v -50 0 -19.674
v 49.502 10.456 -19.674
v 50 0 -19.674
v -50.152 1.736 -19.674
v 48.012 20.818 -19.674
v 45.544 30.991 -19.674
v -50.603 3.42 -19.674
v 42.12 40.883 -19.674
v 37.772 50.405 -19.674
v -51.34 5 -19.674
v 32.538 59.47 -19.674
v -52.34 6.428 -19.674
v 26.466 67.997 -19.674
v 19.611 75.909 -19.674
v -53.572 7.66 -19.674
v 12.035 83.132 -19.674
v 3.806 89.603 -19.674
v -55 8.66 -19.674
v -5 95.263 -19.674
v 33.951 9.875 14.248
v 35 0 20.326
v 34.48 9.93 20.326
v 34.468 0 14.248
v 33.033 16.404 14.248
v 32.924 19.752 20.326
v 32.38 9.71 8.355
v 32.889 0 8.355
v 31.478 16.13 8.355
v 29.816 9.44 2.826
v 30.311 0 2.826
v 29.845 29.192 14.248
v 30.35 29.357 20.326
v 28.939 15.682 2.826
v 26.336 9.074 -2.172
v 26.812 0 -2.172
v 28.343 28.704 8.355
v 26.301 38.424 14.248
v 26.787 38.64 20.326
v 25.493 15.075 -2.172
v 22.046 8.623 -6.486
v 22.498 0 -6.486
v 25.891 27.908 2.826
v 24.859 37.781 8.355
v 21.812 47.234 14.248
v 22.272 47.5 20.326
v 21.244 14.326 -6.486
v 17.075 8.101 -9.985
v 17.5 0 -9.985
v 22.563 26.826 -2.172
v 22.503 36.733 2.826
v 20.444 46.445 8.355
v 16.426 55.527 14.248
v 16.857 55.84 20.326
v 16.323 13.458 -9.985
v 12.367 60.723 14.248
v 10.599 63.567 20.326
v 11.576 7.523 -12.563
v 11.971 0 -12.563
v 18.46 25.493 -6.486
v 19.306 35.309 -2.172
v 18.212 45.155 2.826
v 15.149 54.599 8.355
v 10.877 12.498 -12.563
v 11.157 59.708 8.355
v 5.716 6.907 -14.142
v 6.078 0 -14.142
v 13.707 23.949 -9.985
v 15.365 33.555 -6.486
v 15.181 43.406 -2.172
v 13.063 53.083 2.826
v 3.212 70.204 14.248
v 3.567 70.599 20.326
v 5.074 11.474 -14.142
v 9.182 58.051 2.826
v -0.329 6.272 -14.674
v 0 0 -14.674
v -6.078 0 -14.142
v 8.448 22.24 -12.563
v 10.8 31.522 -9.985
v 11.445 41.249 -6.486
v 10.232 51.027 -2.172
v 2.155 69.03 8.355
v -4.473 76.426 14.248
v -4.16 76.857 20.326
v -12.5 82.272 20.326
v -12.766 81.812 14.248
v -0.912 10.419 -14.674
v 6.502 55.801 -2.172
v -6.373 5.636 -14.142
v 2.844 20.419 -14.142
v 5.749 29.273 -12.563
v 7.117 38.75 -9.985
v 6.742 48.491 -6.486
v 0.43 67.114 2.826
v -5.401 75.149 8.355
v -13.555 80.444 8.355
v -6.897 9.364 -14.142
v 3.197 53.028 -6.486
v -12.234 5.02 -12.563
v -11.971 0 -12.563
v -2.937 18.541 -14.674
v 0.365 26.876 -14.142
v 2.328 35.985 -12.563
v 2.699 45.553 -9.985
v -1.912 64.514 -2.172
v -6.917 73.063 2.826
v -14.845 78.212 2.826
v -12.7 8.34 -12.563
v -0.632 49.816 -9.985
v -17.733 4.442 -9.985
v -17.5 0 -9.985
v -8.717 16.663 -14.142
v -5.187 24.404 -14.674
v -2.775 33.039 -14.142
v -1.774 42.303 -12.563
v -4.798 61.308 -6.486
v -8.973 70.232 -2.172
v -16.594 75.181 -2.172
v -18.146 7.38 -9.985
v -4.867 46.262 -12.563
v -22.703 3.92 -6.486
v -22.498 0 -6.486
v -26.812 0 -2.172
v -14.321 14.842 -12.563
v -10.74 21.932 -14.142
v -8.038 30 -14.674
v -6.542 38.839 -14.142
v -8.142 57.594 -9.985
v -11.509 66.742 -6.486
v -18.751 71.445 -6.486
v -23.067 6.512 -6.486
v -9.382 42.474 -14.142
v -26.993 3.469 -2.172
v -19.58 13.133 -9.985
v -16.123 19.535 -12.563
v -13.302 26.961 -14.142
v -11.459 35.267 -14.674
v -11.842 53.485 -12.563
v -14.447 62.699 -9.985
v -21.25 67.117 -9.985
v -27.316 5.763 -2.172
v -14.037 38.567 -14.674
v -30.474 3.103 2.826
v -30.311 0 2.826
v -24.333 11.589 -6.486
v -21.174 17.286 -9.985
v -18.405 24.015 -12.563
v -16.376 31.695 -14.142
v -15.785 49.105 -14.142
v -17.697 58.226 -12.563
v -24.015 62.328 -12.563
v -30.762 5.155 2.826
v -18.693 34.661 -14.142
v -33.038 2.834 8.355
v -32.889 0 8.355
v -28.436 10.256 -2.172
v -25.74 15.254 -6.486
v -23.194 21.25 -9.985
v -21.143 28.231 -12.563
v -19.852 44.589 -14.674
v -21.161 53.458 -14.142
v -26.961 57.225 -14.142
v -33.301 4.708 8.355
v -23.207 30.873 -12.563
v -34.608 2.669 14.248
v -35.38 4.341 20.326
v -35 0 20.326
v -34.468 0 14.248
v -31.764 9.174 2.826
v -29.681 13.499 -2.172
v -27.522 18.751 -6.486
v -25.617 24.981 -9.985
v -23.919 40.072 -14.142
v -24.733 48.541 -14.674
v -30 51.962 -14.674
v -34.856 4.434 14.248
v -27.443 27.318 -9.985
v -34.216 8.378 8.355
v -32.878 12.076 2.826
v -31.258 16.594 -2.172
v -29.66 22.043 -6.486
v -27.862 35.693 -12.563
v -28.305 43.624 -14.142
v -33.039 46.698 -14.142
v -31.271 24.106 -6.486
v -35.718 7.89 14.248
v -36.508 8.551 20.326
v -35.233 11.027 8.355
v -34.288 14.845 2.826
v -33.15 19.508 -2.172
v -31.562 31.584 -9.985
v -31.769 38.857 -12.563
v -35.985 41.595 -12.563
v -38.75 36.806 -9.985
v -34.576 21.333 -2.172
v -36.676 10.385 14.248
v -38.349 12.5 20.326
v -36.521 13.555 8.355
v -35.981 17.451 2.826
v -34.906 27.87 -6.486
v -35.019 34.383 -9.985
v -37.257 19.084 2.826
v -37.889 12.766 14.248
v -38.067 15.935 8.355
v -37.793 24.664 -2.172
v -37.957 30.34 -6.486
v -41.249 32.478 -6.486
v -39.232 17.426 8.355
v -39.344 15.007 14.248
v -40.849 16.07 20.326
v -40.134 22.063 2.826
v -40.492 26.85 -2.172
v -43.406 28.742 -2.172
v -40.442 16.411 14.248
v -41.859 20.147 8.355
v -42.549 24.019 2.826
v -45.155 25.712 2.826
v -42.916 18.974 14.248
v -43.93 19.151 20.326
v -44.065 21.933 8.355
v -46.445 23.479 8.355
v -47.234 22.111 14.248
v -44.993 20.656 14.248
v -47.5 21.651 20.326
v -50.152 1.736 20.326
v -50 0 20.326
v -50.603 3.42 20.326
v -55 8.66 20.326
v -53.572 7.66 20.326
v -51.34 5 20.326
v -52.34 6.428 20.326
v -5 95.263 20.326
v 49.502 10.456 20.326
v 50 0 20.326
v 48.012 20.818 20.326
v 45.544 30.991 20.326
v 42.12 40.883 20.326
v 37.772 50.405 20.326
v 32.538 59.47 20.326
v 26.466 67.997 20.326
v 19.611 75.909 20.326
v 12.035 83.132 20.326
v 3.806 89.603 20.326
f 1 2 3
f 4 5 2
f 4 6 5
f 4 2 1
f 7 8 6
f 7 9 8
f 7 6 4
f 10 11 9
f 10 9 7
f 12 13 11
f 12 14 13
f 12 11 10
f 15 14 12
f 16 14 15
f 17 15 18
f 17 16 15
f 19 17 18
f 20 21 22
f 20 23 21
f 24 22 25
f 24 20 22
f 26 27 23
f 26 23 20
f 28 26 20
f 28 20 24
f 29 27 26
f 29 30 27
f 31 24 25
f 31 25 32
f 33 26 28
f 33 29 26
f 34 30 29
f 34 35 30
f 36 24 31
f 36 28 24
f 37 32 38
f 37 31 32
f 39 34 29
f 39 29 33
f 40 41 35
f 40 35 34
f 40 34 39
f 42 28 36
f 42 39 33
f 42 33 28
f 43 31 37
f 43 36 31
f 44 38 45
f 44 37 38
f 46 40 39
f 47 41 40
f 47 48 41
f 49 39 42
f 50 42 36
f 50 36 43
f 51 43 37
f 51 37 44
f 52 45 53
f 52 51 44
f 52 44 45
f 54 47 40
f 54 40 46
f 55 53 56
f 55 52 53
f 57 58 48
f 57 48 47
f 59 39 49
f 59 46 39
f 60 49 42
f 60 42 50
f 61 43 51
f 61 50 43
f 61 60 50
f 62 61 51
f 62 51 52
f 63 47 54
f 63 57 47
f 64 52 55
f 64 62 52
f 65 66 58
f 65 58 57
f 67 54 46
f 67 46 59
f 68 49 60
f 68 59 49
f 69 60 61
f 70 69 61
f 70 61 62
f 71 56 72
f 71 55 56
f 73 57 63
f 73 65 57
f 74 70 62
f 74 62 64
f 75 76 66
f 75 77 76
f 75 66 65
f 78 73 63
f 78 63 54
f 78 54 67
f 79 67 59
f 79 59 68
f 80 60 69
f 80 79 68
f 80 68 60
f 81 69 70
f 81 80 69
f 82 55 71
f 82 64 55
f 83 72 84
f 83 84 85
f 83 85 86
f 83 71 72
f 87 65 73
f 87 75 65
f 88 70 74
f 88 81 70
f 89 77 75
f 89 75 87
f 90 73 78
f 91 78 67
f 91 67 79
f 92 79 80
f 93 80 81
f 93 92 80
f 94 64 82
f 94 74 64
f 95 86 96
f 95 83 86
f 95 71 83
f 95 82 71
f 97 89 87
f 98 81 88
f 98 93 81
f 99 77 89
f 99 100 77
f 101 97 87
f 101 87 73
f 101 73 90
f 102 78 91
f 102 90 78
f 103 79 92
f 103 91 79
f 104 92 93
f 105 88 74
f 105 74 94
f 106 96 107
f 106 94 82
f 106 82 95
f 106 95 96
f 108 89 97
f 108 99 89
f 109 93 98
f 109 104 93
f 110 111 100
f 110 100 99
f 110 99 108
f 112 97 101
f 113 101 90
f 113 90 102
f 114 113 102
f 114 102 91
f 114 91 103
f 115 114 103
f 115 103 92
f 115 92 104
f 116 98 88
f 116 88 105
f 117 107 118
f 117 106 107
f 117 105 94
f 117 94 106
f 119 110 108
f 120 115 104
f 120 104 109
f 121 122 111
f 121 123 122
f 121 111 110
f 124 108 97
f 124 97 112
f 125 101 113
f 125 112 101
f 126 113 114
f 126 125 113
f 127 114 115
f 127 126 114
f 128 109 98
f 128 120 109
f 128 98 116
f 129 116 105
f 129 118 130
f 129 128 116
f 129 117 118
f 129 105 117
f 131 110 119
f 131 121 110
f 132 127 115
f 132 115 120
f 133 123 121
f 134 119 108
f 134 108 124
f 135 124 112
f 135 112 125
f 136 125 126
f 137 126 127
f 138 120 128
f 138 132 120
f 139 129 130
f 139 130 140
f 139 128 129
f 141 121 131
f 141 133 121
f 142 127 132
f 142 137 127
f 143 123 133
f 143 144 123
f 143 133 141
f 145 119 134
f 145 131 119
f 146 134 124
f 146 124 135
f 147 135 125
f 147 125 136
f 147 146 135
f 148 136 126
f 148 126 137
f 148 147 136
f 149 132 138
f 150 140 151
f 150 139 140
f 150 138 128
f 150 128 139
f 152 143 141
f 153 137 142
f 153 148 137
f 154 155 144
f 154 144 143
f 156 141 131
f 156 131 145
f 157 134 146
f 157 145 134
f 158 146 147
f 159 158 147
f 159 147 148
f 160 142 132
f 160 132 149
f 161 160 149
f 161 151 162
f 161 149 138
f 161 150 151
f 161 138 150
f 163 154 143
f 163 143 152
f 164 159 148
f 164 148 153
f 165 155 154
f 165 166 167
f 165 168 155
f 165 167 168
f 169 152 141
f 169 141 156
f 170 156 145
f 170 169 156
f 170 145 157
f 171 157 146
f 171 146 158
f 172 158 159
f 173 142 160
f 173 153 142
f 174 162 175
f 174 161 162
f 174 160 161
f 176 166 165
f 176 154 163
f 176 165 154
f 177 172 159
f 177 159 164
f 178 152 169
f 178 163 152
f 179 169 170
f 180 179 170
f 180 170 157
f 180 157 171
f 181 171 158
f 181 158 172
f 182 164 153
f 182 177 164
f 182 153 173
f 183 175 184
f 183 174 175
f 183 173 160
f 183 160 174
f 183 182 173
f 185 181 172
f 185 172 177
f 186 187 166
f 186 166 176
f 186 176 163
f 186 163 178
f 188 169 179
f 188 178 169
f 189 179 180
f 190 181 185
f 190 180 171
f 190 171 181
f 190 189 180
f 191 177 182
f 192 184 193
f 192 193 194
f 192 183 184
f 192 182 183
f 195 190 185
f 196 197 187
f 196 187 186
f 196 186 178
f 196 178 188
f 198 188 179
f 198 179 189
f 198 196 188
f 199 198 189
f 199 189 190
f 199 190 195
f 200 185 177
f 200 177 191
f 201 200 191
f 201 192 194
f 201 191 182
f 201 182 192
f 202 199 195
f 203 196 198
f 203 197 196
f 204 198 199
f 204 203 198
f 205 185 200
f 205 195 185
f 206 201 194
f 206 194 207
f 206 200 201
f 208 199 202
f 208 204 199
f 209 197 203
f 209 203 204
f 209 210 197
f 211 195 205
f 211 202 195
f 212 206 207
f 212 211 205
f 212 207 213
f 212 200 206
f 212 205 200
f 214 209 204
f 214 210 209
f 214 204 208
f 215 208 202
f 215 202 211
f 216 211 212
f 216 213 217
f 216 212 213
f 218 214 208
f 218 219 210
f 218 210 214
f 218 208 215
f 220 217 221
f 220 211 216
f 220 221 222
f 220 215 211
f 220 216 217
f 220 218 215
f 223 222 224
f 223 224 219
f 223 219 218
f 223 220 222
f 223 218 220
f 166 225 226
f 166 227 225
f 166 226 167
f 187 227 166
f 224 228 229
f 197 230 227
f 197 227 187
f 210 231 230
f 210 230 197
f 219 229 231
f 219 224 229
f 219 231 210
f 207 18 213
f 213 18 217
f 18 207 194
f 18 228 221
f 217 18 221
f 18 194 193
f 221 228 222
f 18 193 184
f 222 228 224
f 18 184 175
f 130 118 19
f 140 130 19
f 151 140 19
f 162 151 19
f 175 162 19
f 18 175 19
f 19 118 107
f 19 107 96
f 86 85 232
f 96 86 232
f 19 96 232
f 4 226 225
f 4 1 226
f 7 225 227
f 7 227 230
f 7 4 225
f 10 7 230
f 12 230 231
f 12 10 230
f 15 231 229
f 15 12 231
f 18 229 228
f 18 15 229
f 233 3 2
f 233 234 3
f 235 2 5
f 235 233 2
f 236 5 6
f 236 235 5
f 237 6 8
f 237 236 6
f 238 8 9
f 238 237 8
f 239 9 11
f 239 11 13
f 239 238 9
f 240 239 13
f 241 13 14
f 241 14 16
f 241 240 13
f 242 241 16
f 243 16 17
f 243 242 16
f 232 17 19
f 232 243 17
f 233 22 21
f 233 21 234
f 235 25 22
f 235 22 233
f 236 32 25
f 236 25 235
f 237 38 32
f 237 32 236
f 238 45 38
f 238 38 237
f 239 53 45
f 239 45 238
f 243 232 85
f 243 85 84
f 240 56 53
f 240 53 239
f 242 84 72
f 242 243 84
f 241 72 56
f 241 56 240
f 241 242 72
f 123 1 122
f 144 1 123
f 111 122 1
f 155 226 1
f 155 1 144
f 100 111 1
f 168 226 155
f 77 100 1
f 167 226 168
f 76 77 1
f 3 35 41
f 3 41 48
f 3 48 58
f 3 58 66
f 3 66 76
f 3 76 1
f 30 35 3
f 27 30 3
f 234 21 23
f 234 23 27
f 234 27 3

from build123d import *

# Parameters (mm, degrees)
F1_ANGLE = -60


with BuildPart() as f1:
    # F0 (on Front) → F1 (revolve)
    with BuildSketch(Plane.XZ):
        with BuildLine():
            Line((-50, 20.325956), (-50, -19.674044))
            Line((-50, -19.674044), (0, -19.674044))
            Line((0, -19.674044), (50, -19.674044))
            Line((50, -19.674044), (50, 20.325956))
            Line((50, 20.325956), (35, 20.325956))
            ThreePointArc((35, 20.325956), (0, -14.674044), (-35, 20.325956))
            Line((-35, 20.325956), (-50, 20.325956))
        make_face()
    revolve(axis=Axis((-60, 0, 1.129986), (0, 0, -1)), revolution_arc=F1_ANGLE)


solid = f1.part
